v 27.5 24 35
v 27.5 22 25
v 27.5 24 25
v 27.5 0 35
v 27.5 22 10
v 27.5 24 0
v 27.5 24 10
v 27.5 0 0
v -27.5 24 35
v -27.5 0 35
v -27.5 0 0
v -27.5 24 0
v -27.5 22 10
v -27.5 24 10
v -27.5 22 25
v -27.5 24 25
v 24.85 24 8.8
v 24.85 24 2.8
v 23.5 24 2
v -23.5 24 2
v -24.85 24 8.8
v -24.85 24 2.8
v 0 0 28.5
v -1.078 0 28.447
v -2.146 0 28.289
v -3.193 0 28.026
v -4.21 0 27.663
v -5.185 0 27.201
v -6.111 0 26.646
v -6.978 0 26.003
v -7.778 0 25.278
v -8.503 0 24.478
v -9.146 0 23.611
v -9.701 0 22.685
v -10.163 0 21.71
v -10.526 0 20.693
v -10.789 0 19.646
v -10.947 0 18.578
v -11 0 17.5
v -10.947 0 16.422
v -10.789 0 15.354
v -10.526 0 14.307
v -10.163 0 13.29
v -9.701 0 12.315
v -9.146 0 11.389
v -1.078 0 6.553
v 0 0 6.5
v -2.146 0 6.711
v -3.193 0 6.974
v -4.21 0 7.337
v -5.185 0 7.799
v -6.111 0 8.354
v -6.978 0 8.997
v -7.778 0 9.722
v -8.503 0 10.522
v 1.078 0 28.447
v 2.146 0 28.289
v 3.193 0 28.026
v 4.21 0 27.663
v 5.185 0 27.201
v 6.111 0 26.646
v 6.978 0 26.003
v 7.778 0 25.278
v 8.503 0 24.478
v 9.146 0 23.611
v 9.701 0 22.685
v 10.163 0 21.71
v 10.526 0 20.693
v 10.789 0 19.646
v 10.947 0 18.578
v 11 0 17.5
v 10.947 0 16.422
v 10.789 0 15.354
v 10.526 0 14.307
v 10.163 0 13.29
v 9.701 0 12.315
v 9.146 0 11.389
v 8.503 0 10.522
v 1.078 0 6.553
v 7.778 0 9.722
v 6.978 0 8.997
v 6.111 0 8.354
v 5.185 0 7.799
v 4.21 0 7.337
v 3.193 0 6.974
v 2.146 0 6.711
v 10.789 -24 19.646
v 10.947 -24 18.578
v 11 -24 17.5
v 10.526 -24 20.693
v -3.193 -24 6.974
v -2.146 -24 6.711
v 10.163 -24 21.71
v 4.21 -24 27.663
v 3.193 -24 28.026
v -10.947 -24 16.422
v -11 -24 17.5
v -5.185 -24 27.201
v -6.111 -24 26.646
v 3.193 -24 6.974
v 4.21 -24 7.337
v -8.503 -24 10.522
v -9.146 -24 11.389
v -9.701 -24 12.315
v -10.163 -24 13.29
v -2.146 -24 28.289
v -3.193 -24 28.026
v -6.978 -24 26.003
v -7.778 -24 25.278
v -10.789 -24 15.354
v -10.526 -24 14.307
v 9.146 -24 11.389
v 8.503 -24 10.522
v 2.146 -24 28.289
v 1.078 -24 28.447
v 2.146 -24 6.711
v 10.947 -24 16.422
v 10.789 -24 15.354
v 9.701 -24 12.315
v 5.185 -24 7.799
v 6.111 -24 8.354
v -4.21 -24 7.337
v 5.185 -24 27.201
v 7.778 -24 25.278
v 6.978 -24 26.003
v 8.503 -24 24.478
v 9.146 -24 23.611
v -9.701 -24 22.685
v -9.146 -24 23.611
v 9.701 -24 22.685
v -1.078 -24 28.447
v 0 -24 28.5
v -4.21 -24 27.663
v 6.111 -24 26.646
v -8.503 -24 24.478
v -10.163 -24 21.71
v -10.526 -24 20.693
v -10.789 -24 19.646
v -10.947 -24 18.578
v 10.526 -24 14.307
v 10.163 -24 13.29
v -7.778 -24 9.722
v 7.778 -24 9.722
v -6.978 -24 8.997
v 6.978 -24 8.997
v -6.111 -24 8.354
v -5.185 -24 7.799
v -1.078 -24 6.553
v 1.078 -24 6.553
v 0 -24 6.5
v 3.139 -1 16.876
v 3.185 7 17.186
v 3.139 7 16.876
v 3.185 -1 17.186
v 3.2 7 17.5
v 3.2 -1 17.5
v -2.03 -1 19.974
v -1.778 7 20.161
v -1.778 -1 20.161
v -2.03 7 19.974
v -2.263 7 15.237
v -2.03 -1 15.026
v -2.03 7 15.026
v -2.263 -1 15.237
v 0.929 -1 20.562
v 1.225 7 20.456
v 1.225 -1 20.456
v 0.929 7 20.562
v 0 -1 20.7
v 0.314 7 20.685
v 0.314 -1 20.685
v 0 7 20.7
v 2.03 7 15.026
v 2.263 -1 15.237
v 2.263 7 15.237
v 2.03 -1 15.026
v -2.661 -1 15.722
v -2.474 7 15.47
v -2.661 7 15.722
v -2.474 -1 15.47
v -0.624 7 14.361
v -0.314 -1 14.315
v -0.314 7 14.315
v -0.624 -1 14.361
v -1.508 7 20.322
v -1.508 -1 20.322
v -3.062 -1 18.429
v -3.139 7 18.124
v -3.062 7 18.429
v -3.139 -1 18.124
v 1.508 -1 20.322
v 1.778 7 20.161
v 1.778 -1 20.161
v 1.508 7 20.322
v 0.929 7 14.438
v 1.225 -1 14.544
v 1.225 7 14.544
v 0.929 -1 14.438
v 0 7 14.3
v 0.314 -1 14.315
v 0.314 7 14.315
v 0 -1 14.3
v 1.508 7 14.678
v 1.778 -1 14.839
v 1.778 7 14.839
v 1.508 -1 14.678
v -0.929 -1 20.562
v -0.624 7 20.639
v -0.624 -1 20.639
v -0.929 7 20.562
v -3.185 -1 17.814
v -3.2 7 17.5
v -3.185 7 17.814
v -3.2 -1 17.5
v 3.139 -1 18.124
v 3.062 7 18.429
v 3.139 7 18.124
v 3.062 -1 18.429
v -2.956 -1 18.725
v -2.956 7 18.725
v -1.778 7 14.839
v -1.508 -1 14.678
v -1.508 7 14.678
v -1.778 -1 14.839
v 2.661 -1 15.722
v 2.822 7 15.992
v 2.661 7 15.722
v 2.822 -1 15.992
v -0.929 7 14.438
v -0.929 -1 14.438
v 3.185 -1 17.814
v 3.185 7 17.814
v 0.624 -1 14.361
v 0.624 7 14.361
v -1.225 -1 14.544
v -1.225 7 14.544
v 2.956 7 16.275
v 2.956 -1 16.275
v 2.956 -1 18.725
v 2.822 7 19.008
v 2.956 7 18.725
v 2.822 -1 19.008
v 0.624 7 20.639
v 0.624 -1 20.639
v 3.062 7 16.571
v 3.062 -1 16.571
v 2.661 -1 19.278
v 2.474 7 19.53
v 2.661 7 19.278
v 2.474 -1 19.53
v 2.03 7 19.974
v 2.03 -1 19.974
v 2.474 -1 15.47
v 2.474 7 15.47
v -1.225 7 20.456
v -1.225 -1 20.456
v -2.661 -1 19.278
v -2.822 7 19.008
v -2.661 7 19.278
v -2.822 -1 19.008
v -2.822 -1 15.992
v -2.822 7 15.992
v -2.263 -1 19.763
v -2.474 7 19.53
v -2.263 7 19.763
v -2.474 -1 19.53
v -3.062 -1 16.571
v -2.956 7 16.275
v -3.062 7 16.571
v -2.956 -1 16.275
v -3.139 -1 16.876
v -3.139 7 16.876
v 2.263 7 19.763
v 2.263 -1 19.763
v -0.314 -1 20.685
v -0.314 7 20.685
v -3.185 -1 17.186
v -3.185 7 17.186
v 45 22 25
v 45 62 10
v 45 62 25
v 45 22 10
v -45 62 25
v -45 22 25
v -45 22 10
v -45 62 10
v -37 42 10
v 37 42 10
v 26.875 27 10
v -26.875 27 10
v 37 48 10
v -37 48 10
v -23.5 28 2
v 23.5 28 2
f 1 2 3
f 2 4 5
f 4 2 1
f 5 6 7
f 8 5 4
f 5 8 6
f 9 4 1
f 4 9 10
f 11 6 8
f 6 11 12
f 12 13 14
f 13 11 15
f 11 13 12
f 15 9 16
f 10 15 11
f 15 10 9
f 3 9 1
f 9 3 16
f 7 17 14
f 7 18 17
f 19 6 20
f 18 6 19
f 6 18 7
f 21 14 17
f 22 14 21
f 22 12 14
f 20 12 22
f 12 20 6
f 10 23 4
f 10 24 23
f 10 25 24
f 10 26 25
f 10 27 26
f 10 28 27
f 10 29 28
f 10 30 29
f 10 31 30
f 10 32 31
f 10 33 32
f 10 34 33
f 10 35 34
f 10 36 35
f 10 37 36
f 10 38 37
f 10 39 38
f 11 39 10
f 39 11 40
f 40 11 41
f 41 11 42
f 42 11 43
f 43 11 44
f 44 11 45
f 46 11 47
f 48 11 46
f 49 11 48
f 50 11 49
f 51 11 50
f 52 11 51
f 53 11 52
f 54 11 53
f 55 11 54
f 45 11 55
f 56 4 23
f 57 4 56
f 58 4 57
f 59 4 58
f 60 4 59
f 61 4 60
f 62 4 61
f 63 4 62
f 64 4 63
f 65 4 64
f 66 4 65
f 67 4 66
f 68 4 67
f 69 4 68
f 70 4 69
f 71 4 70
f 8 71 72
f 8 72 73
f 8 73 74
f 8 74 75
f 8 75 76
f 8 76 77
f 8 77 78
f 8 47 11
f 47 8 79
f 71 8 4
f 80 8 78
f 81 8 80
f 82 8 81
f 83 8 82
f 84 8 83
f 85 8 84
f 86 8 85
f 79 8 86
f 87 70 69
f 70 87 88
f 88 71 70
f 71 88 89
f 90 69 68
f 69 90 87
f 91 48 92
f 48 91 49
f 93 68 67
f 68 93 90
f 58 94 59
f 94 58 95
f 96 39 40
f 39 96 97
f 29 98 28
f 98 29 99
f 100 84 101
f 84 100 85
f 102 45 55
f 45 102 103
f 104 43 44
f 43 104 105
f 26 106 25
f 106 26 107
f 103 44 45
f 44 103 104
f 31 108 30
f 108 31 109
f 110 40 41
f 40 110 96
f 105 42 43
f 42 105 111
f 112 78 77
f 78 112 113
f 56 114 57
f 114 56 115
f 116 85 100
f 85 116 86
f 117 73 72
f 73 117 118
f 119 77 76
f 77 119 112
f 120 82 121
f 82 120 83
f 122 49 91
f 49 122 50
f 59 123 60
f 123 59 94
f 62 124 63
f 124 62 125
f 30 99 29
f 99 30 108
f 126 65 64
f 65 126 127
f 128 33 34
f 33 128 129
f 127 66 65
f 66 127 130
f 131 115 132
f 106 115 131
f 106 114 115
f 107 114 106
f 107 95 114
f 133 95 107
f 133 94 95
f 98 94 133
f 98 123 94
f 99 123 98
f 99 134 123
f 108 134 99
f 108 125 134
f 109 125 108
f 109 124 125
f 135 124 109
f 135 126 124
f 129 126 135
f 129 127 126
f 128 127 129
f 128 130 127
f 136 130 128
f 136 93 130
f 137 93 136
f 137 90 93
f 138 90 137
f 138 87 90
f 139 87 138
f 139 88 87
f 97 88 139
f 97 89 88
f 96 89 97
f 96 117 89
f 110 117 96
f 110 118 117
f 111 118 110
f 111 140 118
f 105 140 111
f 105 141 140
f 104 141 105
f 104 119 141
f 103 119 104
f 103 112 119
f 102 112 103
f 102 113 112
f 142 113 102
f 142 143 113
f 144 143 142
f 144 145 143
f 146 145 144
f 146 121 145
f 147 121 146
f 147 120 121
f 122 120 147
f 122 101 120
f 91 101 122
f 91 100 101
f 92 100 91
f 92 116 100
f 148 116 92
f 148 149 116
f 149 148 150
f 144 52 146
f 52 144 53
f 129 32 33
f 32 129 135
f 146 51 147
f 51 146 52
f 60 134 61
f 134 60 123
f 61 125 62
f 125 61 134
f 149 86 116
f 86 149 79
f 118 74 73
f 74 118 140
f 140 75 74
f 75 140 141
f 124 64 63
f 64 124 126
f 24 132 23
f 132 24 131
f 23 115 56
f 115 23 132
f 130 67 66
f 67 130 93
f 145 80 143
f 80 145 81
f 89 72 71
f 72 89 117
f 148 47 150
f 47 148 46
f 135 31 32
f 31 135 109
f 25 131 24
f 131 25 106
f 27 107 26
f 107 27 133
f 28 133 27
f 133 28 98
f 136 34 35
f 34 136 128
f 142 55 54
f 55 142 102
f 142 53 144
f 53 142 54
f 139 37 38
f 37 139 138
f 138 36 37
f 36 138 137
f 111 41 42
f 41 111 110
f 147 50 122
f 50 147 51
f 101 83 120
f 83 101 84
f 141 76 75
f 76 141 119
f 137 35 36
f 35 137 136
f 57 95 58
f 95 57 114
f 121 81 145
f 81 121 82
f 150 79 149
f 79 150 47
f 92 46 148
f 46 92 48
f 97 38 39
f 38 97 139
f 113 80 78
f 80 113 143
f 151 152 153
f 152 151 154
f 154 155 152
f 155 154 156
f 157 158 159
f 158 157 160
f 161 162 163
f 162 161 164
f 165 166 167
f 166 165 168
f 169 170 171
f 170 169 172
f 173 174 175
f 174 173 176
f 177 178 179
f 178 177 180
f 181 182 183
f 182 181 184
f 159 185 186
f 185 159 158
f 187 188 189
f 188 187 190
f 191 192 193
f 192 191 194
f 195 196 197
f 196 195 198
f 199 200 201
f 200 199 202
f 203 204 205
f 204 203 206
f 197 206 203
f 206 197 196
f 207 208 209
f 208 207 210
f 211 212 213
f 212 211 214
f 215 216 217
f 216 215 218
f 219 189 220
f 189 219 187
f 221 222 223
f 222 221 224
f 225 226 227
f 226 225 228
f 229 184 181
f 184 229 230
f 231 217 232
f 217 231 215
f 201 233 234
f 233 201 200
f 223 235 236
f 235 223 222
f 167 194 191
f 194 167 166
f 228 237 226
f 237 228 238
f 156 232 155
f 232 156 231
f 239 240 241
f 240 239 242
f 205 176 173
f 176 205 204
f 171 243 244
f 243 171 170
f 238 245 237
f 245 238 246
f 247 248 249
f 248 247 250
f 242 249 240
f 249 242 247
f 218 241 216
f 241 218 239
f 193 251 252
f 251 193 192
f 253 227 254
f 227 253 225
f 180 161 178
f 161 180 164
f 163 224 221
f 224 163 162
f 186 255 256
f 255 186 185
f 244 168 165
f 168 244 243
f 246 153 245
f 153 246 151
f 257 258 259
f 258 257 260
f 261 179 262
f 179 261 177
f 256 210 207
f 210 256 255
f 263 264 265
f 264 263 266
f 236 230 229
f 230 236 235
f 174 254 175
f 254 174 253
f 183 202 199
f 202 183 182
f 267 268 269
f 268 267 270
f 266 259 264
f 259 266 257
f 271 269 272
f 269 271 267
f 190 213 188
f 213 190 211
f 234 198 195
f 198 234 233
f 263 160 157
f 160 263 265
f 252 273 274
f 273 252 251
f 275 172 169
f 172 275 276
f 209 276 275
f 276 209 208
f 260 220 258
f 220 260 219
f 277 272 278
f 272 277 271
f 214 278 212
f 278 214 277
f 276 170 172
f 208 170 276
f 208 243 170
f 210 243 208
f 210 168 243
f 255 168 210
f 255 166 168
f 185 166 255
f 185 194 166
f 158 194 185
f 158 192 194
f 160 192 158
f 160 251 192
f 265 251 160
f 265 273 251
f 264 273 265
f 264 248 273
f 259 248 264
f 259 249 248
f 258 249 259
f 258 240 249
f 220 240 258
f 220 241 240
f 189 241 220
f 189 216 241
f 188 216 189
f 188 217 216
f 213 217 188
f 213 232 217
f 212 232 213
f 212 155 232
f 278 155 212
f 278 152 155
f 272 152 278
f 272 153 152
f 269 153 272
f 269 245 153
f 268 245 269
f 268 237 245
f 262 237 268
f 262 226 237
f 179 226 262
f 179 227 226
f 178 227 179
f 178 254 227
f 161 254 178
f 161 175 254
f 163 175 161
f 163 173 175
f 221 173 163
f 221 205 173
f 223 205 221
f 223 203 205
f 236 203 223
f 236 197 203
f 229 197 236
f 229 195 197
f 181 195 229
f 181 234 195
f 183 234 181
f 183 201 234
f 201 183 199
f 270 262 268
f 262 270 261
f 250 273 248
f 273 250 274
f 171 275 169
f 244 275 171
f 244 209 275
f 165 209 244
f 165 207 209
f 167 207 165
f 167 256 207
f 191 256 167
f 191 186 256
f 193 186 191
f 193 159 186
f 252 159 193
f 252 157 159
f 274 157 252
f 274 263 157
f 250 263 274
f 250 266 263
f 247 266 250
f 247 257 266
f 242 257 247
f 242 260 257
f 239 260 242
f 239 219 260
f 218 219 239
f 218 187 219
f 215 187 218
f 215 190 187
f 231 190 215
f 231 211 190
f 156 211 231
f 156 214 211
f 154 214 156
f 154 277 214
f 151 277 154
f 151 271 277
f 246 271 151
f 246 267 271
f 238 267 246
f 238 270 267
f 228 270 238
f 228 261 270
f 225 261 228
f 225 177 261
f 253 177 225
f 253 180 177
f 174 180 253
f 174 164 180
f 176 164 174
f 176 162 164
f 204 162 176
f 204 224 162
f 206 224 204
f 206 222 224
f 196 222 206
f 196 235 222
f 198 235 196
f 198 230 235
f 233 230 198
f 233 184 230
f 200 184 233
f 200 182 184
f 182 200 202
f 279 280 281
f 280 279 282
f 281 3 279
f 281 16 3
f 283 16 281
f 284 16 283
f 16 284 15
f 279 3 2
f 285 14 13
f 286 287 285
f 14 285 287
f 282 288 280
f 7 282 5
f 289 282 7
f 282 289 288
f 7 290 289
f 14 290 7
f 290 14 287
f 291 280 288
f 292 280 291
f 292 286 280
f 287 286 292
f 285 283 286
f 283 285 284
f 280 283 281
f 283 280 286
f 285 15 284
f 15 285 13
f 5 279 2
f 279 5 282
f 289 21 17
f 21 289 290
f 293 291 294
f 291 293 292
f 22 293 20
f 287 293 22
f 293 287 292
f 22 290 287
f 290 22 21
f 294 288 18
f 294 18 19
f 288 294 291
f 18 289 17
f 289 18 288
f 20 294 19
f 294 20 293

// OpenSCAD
// Xiaomi 1S pole-mount head
// Units: millimeters
// Use with a locking 1/4-inch friction arm, not a soft unloaded ball head.

/* [USER PARAMETERS] */

top_tab_thickness = 15;
top_tab_width = 90;
top_tab_height = 40;
base_width = 55;
base_depth = 35;
base_height = 24;

// Heat-set threaded insert for a 1/4-20 screw.
insert_diameter = 6.4;
insert_depth = 8.0;

/* [QUALITY] */

$fn = 64;

assert(top_tab_thickness >= 12,
       "top_tab_thickness below 12 mm may not hold the Xiaomi base securely");

module quarter_twenty_boss() {
    difference() {
        union() {
            translate([-base_width / 2, 0, 0])
                cube([base_width, base_height, base_depth]);

            translate([0, 0, base_depth / 2])
                rotate([90, 0, 0])
                    cylinder(
                        h = base_height,
                        d = 22,
                        center = false
                    );
        }

        // Vertical heat-set insert opening.
        translate([0, -1, base_depth / 2])
            rotate([-90, 0, 0])
                cylinder(
                    h = insert_depth,
                    d = insert_diameter
                );
    }
}

module top_tab() {
    translate([
        -top_tab_width / 2,
        base_height - 2,
        (base_depth - top_tab_thickness) / 2
    ])
        cube([
            top_tab_width,
            top_tab_height,
            top_tab_thickness
        ]);
}

module rear_gusset() {
    hull() {
        translate([-base_width / 2 + 4, base_height - 2, 2])
            cube([base_width - 8, 6, 6]);
        translate([-top_tab_width / 2 + 8, base_height + 18,
                   (base_depth - top_tab_thickness) / 2])
            cube([top_tab_width - 16, 6, 6]);
    }
}

union() {
    quarter_twenty_boss();
    top_tab();
    rear_gusset();
}
